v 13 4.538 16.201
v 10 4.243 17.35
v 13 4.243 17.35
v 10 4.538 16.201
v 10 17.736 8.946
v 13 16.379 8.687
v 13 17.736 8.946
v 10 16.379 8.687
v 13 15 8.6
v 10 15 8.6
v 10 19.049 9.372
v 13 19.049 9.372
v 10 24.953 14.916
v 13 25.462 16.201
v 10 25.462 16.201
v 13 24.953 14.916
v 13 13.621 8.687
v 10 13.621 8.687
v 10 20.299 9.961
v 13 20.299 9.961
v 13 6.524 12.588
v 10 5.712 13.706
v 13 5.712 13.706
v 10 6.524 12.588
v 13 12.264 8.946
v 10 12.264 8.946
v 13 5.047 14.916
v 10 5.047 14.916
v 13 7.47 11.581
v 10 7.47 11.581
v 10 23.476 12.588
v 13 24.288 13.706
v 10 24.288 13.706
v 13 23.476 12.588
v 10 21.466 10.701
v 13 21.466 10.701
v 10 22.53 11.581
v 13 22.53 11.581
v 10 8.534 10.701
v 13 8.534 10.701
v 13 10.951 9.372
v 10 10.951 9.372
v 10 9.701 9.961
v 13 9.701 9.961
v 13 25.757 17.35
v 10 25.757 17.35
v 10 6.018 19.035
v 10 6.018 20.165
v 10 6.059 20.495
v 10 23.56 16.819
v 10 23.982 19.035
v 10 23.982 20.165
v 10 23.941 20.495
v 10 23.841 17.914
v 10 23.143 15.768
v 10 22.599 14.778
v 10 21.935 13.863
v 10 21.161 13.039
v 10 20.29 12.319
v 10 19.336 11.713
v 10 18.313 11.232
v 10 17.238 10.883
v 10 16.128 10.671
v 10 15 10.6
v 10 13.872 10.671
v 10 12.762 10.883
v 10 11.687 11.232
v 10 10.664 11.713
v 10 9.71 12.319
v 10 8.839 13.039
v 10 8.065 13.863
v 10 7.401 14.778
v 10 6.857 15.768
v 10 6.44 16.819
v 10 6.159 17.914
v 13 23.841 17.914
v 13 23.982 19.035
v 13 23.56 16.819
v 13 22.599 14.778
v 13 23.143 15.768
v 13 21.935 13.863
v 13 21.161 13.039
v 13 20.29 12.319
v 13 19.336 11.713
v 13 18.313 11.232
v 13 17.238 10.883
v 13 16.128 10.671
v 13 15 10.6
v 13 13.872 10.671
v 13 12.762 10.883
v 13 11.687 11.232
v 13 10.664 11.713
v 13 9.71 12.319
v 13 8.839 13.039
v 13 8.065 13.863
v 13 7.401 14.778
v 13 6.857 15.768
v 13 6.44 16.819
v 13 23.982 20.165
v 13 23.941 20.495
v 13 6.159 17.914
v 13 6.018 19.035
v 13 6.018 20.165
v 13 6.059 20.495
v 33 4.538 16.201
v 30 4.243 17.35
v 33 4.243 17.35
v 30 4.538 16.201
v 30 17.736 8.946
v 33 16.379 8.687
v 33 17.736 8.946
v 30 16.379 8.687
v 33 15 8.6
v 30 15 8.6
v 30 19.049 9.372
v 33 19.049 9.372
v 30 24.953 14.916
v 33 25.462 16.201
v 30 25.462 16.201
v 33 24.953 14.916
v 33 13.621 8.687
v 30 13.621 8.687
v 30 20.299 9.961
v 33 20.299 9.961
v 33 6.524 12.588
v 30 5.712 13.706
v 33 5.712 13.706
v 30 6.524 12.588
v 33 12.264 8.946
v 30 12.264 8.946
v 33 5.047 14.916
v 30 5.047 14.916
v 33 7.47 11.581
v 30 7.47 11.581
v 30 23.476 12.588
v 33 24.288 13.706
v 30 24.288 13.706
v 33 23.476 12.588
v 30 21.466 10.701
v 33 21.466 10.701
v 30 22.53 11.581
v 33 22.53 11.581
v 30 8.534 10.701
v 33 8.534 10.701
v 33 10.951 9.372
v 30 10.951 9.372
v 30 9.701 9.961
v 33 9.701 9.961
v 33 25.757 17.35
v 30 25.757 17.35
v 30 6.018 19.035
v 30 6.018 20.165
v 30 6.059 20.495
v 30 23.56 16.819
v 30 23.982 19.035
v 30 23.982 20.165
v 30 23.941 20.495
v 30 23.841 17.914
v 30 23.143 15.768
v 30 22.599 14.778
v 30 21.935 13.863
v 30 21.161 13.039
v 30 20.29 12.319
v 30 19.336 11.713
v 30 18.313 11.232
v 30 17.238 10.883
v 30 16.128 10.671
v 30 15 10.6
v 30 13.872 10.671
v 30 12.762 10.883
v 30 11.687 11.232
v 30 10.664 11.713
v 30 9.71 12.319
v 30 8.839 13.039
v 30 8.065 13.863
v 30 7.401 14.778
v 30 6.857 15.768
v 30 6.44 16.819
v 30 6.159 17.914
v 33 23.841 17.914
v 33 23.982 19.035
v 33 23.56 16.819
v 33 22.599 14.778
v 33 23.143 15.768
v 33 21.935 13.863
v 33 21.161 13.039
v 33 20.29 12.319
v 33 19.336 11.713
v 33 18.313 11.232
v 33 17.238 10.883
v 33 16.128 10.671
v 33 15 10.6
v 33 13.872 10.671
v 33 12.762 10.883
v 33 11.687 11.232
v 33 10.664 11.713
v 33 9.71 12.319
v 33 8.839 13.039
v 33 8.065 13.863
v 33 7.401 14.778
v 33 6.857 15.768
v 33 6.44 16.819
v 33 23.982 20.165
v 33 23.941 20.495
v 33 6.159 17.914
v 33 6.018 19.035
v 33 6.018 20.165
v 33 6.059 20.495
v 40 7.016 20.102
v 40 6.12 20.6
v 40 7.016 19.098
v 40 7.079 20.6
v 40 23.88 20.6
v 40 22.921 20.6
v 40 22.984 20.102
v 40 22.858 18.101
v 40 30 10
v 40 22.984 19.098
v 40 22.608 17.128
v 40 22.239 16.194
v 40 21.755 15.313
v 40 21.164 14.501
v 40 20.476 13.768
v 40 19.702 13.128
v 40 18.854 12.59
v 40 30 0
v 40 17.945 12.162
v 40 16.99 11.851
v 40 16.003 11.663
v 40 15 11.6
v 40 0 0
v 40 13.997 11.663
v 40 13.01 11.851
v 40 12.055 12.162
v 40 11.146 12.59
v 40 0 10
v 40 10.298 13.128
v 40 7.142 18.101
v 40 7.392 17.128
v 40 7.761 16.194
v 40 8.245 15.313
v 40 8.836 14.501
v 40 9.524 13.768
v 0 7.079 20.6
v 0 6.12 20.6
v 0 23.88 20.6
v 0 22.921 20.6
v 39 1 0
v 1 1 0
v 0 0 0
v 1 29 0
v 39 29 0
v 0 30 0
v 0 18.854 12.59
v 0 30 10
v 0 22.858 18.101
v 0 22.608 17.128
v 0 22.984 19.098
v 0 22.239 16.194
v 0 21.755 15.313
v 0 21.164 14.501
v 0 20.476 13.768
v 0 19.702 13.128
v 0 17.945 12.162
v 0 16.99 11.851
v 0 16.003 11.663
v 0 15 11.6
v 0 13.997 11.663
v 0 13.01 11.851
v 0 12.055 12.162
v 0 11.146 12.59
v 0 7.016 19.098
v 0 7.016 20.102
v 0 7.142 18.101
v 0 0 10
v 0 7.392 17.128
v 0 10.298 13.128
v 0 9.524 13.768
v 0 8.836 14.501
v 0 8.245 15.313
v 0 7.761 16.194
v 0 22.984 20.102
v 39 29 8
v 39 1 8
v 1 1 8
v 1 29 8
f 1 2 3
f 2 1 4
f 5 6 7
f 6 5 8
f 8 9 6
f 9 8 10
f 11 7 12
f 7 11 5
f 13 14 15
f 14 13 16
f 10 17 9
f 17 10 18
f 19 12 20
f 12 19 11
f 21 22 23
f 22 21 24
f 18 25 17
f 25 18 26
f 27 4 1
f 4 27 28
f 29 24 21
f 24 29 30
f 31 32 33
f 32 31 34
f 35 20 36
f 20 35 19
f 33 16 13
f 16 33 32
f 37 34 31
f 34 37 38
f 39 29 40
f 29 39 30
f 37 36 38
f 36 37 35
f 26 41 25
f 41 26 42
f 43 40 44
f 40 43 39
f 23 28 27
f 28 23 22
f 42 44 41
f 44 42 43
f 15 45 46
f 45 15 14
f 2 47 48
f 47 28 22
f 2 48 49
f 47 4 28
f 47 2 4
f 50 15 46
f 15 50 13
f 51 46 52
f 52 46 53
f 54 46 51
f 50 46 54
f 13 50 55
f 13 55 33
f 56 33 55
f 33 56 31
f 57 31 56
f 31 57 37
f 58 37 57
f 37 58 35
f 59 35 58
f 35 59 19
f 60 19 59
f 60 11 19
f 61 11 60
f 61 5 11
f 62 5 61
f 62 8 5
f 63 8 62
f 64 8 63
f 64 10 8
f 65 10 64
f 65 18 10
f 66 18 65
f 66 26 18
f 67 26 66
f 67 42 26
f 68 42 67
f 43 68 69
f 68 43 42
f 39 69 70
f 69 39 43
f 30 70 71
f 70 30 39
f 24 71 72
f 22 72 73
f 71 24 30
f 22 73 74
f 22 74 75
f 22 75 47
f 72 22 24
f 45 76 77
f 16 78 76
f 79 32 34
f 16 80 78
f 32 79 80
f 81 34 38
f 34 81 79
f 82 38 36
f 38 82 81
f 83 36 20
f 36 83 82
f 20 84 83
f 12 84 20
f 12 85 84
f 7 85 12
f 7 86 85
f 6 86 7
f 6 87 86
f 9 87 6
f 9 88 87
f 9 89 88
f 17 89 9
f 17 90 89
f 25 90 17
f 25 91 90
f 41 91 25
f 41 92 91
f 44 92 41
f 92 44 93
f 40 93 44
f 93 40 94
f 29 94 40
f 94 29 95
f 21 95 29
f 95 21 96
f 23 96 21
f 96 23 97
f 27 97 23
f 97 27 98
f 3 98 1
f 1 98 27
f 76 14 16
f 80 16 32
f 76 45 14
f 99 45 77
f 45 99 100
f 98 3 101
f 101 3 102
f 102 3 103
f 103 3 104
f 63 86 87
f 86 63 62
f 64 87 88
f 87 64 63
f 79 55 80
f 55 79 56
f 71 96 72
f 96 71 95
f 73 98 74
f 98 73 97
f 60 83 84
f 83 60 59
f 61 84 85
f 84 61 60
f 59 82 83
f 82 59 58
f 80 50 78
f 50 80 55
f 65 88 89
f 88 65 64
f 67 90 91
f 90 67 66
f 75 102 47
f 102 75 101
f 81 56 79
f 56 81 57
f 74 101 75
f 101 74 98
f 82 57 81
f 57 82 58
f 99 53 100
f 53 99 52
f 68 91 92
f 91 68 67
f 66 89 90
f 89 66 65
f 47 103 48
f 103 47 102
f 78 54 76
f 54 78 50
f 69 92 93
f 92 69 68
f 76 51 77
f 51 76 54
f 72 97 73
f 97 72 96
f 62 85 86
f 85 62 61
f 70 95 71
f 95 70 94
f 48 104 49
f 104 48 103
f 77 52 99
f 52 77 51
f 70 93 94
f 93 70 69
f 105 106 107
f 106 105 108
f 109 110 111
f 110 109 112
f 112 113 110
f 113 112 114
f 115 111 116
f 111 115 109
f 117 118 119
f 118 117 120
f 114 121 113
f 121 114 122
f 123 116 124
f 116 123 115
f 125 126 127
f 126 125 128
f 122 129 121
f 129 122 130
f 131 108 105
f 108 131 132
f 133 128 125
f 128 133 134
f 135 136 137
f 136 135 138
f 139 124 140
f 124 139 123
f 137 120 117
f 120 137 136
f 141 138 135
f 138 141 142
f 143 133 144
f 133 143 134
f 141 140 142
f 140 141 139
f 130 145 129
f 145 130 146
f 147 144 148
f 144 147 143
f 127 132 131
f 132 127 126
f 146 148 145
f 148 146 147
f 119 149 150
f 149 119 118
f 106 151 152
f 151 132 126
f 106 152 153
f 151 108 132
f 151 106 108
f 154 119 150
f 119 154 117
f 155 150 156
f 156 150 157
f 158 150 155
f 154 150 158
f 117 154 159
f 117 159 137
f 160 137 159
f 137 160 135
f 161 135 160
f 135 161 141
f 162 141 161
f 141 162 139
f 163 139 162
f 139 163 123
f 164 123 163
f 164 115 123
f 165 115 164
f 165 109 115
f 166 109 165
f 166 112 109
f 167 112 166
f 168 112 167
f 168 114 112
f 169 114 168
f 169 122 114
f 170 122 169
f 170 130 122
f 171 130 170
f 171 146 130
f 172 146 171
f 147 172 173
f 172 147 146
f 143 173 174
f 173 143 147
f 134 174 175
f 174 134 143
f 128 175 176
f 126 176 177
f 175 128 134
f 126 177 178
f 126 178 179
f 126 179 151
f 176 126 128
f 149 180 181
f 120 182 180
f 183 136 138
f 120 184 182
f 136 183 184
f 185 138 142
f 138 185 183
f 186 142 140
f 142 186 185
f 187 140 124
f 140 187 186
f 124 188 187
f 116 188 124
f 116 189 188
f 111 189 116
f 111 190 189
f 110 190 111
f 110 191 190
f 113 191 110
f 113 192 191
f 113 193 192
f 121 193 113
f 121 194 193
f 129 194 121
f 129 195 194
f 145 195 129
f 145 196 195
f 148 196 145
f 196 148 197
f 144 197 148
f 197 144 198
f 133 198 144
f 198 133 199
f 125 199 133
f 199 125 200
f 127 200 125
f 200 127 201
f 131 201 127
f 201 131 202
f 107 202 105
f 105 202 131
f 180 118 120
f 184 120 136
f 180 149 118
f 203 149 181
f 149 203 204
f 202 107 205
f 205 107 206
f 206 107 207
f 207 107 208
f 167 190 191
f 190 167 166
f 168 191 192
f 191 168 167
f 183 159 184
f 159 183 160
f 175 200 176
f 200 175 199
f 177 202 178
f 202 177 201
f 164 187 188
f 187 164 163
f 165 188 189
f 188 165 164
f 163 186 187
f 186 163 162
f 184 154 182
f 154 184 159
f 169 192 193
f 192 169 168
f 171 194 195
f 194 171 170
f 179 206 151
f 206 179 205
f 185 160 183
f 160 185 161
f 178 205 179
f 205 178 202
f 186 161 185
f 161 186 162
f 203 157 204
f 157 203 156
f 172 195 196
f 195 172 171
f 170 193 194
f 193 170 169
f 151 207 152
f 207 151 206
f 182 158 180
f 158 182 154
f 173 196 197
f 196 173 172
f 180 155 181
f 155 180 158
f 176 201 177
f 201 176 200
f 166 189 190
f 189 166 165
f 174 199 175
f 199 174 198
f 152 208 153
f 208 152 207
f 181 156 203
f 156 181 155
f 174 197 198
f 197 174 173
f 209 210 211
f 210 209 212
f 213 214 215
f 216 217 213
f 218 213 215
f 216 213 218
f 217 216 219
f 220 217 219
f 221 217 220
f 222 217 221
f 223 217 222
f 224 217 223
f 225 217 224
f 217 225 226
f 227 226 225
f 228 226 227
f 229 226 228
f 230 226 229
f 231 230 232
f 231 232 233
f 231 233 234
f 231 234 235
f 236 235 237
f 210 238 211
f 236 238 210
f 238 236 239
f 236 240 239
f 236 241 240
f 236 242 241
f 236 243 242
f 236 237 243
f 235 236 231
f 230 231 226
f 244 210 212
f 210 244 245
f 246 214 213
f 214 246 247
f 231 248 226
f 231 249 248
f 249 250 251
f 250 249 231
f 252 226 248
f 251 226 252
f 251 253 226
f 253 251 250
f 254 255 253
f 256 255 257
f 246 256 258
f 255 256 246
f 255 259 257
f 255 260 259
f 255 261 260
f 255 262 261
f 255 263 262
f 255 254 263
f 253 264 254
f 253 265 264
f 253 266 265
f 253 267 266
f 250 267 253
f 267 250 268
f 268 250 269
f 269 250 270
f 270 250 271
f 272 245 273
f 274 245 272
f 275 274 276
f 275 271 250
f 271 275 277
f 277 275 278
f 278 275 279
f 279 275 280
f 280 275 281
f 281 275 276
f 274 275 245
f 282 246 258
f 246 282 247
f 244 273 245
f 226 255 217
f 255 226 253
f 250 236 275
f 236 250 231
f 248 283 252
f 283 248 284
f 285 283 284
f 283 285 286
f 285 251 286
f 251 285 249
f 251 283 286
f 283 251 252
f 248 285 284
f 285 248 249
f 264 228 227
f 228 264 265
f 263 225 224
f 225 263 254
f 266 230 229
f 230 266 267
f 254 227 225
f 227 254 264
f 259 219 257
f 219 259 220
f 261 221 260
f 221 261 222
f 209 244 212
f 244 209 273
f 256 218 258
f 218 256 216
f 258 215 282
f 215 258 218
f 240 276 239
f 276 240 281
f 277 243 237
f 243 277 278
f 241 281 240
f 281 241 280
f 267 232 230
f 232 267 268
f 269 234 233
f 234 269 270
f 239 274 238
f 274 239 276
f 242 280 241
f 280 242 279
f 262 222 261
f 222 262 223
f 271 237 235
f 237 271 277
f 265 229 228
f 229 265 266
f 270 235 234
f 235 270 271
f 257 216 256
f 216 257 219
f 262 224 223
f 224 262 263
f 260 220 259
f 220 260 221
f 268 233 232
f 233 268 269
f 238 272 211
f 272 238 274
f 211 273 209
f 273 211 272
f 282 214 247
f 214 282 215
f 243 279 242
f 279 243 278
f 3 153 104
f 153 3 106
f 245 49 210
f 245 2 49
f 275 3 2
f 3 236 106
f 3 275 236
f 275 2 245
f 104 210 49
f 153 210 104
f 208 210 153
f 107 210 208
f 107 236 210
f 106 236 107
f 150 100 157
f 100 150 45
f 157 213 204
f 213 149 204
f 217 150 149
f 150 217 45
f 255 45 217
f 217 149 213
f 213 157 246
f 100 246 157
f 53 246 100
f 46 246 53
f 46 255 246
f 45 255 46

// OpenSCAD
tubeDiameter = 8; // [1:25]
nonSlipMatThickness = 10; // [3:13]

cubeHeight = nonSlipMatThickness + tubeDiameter + 2.6;


difference() { 
    cube([40, 30, cubeHeight]);                                                             // Main cube
    translate([1, 1, 0]) cube([38, 28, nonSlipMatThickness - 2]);                           // nonSlip cube
    translate([0, 15, cubeHeight - 1]) rotate(a=[0, 90, 0]) { cylinder(r=tubeDiameter, h=40, $fn=50); } // Tube
    translate([10, 15, cubeHeight - 1]) rotate(a=[0, 90, 0]) {                              // Electric Strip hole 1 
        difference() { 
            cylinder(r=tubeDiameter + 3, h=3, $fn=50);
            cylinder(r=tubeDiameter + 1, h=3, $fn=50);
        }
    }

    translate([30, 15, cubeHeight - 1]) rotate(a=[0, 90, 0]) {                              // Electric Strip hole 2
        difference() { 
            cylinder(r=tubeDiameter + 3, h=3, $fn=50);
            cylinder(r=tubeDiameter + 1, h=3, $fn=50);
        }
    }
    translate([0, 0, 10]) rotate(a=[60, 0, 0]) cube([ 40, 15, 10 ]);                        // Angled cutaway
    mirror([0, 1, 0]) translate([0, -30, 10]) rotate(a=[60, 0, 0]) cube([ 40, 15, 10 ]);    // Angled cutaway
}
